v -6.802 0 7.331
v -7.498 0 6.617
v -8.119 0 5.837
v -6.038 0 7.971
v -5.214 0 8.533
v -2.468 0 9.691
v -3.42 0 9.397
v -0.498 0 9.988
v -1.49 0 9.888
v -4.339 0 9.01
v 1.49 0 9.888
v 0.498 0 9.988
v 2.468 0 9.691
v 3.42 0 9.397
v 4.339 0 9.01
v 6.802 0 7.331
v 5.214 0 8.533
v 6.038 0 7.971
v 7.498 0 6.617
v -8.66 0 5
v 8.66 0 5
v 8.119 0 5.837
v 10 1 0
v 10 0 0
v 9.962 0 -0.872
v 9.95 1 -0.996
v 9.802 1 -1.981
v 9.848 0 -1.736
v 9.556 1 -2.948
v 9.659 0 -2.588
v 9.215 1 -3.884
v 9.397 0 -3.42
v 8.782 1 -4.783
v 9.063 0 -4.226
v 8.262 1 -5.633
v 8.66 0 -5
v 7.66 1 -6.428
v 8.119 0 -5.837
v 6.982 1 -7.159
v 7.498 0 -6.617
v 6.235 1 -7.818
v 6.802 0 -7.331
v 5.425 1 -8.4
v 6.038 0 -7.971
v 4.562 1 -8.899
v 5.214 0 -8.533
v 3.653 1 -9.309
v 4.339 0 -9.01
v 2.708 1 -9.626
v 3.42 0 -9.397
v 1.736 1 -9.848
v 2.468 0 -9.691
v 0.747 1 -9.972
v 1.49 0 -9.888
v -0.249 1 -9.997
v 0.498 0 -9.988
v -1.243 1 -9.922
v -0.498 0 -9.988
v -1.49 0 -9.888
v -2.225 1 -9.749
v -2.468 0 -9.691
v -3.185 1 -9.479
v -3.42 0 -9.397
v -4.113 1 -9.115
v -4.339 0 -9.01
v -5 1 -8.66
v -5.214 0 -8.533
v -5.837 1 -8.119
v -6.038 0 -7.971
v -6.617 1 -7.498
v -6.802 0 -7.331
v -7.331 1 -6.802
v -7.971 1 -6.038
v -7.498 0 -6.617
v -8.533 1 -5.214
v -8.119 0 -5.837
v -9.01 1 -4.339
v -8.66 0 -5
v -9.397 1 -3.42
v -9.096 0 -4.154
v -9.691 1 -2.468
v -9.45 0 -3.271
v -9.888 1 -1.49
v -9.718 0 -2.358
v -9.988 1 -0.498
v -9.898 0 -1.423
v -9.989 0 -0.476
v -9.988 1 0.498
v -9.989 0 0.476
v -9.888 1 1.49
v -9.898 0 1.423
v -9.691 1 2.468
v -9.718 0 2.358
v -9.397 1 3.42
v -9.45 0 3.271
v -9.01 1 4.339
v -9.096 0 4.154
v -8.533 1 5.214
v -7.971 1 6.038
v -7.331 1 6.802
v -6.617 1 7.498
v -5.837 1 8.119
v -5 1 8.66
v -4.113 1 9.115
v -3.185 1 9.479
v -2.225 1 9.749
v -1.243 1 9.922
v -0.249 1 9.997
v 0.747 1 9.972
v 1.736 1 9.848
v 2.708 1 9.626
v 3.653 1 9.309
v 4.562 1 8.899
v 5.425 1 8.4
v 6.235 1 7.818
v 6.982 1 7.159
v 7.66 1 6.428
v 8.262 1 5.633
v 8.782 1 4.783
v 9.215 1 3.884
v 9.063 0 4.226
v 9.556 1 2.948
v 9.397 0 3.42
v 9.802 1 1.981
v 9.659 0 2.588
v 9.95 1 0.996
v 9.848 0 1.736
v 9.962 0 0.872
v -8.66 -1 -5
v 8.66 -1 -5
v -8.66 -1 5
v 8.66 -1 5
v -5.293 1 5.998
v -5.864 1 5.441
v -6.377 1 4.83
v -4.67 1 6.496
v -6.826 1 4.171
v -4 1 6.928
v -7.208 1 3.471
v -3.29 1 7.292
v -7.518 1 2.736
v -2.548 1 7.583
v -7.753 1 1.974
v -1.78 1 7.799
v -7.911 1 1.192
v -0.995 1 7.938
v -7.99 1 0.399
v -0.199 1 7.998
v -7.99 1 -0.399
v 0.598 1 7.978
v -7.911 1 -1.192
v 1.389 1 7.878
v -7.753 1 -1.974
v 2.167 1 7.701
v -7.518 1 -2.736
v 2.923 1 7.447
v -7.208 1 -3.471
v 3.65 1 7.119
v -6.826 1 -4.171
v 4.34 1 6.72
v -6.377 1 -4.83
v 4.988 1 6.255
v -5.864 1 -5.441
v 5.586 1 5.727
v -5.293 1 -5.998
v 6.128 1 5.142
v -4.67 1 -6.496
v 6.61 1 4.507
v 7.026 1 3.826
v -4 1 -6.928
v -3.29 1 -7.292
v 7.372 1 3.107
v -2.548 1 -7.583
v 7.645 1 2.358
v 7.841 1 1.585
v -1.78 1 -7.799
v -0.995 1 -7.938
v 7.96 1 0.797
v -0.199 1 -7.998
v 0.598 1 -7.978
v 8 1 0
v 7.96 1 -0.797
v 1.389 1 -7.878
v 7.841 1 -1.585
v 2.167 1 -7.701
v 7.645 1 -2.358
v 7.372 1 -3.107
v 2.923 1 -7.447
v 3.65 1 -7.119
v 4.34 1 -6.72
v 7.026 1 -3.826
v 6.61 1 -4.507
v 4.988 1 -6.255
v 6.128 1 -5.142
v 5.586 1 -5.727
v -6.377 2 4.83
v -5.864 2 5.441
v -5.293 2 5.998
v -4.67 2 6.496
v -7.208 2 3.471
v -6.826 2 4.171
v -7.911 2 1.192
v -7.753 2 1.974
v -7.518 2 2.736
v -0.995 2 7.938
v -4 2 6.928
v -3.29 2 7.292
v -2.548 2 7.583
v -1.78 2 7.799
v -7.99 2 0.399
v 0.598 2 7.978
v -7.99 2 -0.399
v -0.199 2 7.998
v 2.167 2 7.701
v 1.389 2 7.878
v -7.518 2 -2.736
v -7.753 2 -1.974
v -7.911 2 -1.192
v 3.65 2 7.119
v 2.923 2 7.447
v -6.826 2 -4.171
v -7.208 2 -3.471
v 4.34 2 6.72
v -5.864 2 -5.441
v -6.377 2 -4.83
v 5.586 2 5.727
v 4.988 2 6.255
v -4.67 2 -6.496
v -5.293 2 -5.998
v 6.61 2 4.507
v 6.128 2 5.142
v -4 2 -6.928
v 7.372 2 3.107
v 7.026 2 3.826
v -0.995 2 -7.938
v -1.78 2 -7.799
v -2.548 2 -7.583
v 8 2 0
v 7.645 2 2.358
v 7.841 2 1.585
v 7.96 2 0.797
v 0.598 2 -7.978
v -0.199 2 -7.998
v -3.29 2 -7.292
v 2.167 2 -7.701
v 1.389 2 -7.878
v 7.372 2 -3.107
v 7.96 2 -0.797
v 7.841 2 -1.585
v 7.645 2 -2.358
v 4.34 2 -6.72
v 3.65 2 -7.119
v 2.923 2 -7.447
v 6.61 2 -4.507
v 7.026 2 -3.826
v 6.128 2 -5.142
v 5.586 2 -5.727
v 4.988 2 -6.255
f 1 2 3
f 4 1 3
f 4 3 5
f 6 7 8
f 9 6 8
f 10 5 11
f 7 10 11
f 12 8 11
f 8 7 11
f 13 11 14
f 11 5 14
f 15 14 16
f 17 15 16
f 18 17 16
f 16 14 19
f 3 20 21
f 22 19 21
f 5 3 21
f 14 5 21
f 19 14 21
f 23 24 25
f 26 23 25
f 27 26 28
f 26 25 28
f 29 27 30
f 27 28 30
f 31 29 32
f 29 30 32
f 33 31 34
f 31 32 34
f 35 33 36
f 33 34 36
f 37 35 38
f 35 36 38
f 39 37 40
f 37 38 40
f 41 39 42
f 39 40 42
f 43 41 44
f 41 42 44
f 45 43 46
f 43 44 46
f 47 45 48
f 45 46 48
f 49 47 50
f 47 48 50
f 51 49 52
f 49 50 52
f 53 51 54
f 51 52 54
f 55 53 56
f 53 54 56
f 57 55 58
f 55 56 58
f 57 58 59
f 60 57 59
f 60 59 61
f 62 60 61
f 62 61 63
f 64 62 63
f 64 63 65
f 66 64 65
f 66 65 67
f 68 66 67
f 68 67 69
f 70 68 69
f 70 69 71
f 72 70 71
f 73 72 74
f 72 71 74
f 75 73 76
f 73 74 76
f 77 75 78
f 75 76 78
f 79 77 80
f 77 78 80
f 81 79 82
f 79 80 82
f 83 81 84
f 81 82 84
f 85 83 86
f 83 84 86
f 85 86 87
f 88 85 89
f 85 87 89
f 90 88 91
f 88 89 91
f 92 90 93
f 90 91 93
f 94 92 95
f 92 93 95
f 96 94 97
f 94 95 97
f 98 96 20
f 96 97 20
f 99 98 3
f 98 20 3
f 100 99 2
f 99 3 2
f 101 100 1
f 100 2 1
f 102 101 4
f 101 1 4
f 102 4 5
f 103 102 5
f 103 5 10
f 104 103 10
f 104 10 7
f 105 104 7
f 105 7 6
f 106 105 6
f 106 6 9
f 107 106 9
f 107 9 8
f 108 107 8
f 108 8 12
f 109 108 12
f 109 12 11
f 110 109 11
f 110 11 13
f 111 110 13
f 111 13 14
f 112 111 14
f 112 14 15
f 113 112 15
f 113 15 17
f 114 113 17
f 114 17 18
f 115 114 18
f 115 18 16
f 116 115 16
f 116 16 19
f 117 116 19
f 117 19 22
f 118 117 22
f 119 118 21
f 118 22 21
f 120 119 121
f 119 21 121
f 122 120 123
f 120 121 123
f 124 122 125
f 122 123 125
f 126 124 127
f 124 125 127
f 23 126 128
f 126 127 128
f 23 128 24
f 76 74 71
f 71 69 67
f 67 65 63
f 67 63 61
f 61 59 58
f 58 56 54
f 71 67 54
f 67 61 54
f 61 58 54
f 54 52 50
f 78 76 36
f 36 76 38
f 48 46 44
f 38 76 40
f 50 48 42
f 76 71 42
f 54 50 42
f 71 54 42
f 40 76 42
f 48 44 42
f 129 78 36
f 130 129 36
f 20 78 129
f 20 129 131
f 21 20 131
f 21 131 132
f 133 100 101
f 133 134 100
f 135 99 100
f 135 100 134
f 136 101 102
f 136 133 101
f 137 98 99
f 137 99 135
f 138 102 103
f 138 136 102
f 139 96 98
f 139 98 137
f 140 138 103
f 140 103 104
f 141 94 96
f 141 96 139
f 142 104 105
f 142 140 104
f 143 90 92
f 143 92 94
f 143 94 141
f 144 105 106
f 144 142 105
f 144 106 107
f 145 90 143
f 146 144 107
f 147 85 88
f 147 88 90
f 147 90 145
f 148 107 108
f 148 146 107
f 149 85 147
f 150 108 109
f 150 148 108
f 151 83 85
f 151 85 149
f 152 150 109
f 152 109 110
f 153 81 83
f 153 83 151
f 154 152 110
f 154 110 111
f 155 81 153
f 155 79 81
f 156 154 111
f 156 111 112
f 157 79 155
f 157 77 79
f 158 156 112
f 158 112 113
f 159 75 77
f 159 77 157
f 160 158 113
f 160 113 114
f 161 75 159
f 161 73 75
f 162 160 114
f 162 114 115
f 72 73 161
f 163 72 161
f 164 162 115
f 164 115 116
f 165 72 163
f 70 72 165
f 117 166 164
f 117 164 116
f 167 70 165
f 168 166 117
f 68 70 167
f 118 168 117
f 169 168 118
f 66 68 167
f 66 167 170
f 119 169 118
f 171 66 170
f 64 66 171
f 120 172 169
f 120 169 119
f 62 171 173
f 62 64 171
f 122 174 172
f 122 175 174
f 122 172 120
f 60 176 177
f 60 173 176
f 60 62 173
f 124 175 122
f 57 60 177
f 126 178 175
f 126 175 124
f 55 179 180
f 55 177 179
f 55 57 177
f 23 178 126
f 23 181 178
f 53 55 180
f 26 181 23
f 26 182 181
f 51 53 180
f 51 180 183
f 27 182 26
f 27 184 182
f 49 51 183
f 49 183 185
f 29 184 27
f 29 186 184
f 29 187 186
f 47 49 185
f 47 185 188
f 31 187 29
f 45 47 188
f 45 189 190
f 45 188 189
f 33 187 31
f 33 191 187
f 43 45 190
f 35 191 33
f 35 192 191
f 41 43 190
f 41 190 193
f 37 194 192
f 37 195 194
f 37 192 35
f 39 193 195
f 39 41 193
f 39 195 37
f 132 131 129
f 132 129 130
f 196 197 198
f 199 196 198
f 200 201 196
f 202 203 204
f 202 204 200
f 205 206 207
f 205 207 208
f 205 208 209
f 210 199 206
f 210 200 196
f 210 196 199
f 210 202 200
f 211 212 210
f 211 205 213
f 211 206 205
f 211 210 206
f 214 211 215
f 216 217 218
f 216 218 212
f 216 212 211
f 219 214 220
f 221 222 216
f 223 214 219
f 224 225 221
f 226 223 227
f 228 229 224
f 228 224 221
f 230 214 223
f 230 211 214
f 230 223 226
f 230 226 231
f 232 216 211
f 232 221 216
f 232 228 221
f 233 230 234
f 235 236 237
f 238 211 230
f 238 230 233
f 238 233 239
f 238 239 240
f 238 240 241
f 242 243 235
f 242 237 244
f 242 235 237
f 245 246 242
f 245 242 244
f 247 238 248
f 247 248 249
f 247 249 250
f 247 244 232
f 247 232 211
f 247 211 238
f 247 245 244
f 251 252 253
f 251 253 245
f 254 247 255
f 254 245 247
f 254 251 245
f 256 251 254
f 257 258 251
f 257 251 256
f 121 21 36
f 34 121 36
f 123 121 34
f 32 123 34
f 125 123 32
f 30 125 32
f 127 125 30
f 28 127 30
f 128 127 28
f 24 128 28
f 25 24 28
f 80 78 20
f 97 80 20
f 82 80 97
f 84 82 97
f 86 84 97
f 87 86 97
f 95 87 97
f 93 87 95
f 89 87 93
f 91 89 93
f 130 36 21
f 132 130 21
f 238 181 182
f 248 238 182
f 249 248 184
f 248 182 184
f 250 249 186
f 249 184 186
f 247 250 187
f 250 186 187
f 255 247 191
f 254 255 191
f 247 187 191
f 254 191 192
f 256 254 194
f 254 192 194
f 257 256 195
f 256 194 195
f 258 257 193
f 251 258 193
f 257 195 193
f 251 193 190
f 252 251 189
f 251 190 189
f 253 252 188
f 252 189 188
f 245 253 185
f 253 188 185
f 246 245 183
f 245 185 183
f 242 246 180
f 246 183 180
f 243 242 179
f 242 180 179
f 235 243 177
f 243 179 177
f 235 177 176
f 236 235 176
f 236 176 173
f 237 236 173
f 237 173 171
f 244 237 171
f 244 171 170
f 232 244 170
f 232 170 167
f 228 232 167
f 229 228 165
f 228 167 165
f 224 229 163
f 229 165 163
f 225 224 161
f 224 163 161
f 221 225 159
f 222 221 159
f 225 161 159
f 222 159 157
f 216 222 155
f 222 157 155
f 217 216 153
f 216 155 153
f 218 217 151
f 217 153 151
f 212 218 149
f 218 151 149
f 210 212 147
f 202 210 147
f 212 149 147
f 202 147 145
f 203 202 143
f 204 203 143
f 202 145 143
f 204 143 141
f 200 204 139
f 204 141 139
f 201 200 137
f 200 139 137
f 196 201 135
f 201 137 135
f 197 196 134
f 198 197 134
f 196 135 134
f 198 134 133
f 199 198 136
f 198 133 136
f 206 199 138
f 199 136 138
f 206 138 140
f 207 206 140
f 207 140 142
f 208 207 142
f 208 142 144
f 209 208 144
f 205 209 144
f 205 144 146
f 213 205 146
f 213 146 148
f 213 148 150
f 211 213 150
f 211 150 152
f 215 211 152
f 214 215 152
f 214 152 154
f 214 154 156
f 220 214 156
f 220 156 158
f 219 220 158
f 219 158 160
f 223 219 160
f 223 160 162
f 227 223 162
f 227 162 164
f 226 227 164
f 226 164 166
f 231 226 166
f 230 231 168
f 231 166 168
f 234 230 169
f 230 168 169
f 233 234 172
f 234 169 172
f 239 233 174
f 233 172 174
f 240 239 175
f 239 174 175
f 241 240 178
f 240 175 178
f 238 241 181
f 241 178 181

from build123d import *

# Parameters (mm, degrees)
ESBO_O1_R                = 10
RESSALTO_EXTRUS_O1_DEPTH = 1
ESBO_O2_R                = 8
RESSALTO_EXTRUS_O2_DEPTH = 1
ESBO_O3_W                = 17.320508076
ESBO_O3_H                = 10
RESSALTO_EXTRUS_O3_DEPTH = 1


with BuildPart() as part:
    # Esboço1 → Ressalto-extrusão1 (new body)
    with BuildSketch(Plane(origin=(0, 0, 0), x_dir=(1, 0, 0), z_dir=(0, 1, 0))):
        Circle(ESBO_O1_R)
    extrude(amount=RESSALTO_EXTRUS_O1_DEPTH)

    # Esboço2 → Ressalto-extrusão2 (add)
    with BuildSketch(Plane(origin=(0, 1, 0), x_dir=(1, 0, 0), z_dir=(0, 1, 0))):
        Circle(ESBO_O2_R)
    extrude(amount=RESSALTO_EXTRUS_O2_DEPTH)

    # Esboço3 → Ressalto-extrusão3 (add)
    with BuildSketch(Plane.XZ):
        Rectangle(ESBO_O3_W, ESBO_O3_H)
    extrude(amount=RESSALTO_EXTRUS_O3_DEPTH)


solid = part.part
